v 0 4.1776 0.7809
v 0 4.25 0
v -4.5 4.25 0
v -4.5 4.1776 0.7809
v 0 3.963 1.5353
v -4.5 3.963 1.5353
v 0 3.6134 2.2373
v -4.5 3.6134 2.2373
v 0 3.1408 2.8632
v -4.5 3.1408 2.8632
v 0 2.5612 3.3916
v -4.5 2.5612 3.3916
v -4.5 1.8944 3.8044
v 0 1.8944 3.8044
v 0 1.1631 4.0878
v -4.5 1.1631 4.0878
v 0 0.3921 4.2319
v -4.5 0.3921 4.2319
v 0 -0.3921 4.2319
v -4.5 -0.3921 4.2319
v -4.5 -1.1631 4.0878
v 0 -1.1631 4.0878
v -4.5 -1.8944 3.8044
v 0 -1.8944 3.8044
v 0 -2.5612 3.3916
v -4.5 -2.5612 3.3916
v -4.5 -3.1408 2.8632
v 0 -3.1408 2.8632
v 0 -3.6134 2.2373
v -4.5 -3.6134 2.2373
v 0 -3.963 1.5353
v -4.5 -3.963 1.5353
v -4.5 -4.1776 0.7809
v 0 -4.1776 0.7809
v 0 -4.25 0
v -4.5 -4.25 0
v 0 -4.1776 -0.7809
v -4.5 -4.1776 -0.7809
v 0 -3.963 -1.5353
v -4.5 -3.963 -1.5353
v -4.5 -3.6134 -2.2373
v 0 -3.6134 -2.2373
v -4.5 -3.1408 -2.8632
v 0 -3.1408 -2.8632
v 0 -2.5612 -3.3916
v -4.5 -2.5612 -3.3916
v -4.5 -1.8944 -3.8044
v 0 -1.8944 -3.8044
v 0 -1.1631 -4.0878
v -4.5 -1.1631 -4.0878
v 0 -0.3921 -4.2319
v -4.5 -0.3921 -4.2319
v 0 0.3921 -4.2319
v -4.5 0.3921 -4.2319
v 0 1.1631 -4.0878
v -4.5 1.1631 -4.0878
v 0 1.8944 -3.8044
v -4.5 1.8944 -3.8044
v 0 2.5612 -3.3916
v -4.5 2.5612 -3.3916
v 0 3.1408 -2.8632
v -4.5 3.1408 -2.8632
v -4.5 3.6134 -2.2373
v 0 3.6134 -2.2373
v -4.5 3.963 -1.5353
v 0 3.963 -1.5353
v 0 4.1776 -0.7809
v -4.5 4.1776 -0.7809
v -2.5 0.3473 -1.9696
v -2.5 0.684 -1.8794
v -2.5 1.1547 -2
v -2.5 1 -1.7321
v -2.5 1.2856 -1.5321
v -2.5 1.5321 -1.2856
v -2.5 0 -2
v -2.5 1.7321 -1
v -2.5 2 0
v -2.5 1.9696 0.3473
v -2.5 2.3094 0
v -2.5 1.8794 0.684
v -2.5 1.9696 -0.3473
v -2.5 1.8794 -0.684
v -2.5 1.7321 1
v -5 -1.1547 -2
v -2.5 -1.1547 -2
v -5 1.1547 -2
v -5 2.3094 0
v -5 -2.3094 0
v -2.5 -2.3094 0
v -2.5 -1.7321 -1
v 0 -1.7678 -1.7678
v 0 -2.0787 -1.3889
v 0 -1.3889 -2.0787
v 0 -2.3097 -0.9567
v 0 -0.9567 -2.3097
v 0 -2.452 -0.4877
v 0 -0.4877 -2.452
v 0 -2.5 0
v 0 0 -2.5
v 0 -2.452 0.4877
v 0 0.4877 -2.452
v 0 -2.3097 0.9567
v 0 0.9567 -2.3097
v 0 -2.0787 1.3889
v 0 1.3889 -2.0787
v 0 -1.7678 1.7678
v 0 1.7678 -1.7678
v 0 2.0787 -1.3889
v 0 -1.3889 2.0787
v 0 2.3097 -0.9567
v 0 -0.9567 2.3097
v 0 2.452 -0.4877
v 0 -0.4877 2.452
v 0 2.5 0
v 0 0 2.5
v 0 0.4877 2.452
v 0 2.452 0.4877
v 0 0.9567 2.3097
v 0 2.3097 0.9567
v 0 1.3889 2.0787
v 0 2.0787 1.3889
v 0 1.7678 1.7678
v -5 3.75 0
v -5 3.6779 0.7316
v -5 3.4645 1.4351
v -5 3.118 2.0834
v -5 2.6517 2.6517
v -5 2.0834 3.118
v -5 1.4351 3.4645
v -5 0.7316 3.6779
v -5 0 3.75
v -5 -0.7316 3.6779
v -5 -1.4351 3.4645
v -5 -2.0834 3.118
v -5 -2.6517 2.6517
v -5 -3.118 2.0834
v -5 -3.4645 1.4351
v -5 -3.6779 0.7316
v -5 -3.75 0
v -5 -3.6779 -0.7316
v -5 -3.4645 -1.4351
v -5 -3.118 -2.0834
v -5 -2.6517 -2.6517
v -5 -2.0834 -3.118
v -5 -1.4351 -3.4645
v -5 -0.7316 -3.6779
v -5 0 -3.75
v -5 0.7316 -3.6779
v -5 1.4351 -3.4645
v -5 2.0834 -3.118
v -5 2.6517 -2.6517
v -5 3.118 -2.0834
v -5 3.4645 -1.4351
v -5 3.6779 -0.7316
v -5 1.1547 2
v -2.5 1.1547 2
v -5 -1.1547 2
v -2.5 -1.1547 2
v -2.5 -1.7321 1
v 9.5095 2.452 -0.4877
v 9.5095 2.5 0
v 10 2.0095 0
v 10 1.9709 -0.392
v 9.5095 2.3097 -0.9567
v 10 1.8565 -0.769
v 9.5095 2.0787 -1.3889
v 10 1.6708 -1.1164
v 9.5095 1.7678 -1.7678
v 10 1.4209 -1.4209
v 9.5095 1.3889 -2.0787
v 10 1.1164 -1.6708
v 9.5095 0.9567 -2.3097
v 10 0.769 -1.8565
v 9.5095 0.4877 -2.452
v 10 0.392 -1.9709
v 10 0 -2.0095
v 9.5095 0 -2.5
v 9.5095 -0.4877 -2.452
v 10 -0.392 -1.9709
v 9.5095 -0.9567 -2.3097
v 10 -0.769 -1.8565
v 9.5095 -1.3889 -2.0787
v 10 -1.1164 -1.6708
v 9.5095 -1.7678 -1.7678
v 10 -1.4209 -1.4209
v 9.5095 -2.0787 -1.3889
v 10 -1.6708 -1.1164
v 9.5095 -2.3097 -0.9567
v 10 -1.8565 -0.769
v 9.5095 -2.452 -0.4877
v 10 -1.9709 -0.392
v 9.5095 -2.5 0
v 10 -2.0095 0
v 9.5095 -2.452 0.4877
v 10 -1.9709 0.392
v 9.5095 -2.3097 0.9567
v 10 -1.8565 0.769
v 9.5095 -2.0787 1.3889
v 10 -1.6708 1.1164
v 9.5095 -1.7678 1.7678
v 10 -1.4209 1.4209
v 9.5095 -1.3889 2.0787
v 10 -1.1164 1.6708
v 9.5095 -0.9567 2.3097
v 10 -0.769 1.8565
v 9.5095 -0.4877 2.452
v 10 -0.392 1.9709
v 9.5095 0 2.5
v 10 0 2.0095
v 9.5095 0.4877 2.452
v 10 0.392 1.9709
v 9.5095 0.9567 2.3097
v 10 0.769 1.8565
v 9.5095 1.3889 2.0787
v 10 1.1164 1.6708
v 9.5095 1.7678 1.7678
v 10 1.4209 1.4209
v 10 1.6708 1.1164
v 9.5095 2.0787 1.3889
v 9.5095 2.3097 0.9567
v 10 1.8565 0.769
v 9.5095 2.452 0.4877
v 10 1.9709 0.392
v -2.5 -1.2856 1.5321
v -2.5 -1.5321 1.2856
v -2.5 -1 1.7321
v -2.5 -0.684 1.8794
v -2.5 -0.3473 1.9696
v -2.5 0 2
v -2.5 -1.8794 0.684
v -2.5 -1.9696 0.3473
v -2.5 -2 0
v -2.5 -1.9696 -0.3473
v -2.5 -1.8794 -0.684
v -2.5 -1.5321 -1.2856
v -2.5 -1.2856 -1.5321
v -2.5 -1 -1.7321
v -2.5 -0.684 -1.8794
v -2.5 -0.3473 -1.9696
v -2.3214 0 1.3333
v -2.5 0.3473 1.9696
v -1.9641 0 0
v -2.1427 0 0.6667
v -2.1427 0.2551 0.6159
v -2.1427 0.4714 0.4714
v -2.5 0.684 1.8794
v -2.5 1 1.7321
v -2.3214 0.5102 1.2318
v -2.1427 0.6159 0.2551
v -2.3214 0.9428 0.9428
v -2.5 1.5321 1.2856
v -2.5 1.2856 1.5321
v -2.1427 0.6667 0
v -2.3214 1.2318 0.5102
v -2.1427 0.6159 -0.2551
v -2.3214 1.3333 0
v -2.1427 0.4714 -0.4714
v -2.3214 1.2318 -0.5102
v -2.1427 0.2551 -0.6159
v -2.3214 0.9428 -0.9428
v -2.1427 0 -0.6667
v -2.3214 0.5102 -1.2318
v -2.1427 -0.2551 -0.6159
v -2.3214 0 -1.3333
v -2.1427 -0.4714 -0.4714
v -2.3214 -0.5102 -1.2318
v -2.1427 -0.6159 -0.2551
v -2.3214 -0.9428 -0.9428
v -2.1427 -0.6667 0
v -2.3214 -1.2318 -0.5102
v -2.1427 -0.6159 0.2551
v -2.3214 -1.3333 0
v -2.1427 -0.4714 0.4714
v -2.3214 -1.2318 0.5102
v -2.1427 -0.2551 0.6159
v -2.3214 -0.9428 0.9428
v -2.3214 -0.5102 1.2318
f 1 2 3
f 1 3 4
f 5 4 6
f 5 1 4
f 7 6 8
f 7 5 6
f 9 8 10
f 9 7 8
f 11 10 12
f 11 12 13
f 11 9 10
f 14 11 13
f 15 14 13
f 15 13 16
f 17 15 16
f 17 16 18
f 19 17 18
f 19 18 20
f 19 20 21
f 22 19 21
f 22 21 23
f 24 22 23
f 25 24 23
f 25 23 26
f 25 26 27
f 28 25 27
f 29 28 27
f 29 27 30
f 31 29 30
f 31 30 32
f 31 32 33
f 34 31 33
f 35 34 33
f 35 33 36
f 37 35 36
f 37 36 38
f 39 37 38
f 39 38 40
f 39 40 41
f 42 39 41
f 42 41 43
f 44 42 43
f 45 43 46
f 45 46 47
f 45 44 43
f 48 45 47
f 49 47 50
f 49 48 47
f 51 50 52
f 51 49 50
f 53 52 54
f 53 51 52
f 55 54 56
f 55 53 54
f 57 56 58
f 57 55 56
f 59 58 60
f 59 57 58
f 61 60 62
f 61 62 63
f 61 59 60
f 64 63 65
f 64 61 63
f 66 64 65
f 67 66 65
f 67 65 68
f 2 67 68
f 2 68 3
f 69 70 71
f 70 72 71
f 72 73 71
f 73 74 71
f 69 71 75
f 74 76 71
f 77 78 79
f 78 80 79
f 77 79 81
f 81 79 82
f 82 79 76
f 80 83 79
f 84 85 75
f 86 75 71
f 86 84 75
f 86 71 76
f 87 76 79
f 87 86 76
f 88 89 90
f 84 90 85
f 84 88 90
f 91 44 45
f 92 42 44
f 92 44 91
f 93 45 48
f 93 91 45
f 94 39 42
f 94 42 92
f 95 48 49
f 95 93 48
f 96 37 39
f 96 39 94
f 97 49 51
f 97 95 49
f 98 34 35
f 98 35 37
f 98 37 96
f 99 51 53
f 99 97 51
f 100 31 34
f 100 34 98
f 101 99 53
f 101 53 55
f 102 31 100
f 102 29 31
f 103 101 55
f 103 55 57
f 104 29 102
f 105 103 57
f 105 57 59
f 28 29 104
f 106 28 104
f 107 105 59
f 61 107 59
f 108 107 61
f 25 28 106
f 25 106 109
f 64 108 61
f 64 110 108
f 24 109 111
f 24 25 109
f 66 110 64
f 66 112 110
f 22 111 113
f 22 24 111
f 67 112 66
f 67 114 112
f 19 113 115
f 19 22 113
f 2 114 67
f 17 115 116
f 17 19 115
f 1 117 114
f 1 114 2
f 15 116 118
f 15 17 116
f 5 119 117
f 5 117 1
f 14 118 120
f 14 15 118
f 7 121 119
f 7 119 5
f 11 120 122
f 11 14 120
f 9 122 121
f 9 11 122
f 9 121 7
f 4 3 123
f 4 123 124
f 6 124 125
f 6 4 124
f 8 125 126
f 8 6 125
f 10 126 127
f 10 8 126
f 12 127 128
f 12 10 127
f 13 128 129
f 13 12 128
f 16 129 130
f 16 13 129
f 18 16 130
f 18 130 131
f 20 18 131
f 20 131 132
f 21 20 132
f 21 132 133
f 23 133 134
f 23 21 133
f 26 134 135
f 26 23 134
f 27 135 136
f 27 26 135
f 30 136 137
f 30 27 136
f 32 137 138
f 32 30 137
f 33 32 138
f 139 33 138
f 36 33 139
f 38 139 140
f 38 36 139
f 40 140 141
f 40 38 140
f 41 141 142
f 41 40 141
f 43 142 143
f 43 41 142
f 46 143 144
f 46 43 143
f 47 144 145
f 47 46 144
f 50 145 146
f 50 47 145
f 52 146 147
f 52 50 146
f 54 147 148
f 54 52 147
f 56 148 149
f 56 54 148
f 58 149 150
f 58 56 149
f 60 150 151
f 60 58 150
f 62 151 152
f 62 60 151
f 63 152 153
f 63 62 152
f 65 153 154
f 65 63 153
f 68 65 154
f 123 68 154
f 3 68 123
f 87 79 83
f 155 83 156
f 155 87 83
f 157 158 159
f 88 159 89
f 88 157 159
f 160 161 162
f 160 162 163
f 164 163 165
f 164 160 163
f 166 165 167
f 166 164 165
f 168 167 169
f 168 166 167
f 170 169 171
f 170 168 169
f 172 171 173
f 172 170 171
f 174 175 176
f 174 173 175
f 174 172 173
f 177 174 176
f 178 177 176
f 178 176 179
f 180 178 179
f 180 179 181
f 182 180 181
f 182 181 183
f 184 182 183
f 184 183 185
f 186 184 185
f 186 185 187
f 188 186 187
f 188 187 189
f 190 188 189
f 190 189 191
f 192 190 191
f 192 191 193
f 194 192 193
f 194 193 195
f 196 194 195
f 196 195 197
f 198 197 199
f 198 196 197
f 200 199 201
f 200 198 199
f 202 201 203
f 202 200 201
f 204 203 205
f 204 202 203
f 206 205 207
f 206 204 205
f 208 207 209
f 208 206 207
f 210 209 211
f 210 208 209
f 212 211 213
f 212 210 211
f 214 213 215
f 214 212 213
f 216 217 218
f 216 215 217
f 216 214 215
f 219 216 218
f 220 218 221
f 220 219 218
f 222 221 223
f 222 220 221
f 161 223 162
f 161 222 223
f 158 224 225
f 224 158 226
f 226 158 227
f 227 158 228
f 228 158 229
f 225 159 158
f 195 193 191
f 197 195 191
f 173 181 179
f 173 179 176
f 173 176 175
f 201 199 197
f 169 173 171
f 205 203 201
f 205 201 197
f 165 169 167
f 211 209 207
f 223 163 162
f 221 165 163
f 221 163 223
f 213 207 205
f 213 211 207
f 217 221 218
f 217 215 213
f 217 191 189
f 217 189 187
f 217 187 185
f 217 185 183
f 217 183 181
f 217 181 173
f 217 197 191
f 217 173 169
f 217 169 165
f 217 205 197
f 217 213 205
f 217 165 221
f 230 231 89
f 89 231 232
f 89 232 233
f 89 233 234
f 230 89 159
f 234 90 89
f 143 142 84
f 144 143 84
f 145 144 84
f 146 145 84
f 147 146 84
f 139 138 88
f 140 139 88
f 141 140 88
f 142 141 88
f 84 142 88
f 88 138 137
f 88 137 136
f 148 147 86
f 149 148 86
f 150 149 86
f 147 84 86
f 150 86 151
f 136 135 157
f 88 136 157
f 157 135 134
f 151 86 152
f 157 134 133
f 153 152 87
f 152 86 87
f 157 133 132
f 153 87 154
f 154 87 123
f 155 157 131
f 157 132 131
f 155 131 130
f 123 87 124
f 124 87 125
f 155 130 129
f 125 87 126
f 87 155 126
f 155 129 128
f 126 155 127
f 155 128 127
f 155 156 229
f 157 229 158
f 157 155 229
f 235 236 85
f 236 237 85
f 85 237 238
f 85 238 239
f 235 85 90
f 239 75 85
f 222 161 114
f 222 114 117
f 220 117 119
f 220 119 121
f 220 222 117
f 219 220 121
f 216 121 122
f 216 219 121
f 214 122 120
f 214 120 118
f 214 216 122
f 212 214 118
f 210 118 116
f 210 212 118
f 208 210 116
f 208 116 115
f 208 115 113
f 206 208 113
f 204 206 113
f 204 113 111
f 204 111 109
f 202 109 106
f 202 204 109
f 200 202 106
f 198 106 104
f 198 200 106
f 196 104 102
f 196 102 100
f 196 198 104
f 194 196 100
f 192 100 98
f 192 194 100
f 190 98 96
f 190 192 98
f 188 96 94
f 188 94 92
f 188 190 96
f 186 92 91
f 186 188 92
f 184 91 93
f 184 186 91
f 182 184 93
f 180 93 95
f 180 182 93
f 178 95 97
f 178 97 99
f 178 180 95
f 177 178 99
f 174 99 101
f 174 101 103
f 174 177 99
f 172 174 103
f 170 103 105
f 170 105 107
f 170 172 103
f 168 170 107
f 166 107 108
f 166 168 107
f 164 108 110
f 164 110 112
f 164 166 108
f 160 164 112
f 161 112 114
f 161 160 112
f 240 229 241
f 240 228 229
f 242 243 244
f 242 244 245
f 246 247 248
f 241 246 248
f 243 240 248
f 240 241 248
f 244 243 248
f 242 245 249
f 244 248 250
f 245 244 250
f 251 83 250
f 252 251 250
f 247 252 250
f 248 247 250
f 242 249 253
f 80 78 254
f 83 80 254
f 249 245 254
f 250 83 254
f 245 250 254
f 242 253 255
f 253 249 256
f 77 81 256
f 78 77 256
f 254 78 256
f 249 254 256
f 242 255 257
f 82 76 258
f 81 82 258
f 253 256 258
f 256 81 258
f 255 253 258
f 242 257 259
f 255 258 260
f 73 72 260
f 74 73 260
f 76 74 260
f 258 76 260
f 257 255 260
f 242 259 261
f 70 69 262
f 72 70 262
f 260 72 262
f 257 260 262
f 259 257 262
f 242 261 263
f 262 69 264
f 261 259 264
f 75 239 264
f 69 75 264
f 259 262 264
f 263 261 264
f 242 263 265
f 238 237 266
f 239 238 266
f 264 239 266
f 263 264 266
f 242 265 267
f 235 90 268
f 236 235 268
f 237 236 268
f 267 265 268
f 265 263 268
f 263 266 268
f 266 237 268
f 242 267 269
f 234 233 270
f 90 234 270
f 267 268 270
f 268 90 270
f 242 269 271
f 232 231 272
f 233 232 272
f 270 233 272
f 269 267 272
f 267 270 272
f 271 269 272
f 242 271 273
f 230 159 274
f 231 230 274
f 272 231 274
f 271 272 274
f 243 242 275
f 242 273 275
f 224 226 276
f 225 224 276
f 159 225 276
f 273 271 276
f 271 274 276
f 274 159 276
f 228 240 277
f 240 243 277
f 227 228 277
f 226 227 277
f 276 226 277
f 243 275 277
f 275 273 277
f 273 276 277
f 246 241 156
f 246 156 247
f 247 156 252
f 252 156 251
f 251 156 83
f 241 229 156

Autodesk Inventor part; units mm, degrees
sketch "Sketch_1" plane through (0, 0, 0) normal (0, 0, 1) x (1, 0, 0)
  line L0 (10, 0) -> (-5, 0)
  line L1 (-5, 0) -> (-5, 3.75)
  line L2 (-5, 3.75) -> (-4.5, 4.25)
  line L3 (-4.5, 4.25) -> (0, 4.25)
  line L4 (0, 4.25) -> (0, 2.5)
  line L5 (0, 2.5) -> (9.5095, 2.5)
  line L6 (9.5095, 2.5) -> (10, 2.0095)
  line L7 (10, 2.0095) -> (10, 0)
  line L8 (10, 0) -> (-5, 0)
revolve "Revolution1" add sketch "Sketch_1" angle 360 about axis through (10, 0, 0) along (1, 0, 0)
thread "Thread1" size "M5x0.8" class "6g" standard "ISO Metric profile" length 9 offset 1
sketch "Sketch2" plane through (-5, 0, 0) normal (-1, 0, 0) x (0, 0, 1)
  point P0 (0, 0)
hole "Hole1" at (-5, 0, 0) direction (1, 0, 0) diameter 4 depth 2.5 tip angle 150
sketch "Sketch_3" plane through (-5, 0, 0) normal (1, 0, 0) x (0, 0, -1)
  line L0 (-2, 1.1547) -> (-2, -1.1547)
  line L1 (-2, -1.1547) -> (0, -2.3094)
  line L2 (0, -2.3094) -> (2, -1.1547)
  line L3 (2, -1.1547) -> (2, 1.1547)
  line L4 (2, 1.1547) -> (0, 2.3094)
  line L5 (0, 2.3094) -> (-2, 1.1547)
extrude "Extrusion1" cut sketch "Sketch_3" along normal blind 2.5
ref_plane "bolt_to_nut_XY" through (10, 0, 0) normal (1, 0, 0) x (0, 0, -1)
ref_plane "bolt_to_nut_YZ" through (10, 0, 0) normal (0, 0, -1) x (0, 1, 0)
ref_plane "bolt_to_nut_ZX" through (10, 0, 0) normal (0, 1, 0) x (1, 0, 0)
ref_plane "screw1_XY" through (0, 0, 0) normal (1, 0, 0) x (0, 0, -1)
ref_plane "screw1_YZ" through (0, 0, 0) normal (0, 0, -1) x (0, 1, 0)
ref_plane "screw1_ZX" through (0, 0, 0) normal (0, 1, 0) x (1, 0, 0)
properties part number "CB5-10" material "鋼、炭素鋼"
